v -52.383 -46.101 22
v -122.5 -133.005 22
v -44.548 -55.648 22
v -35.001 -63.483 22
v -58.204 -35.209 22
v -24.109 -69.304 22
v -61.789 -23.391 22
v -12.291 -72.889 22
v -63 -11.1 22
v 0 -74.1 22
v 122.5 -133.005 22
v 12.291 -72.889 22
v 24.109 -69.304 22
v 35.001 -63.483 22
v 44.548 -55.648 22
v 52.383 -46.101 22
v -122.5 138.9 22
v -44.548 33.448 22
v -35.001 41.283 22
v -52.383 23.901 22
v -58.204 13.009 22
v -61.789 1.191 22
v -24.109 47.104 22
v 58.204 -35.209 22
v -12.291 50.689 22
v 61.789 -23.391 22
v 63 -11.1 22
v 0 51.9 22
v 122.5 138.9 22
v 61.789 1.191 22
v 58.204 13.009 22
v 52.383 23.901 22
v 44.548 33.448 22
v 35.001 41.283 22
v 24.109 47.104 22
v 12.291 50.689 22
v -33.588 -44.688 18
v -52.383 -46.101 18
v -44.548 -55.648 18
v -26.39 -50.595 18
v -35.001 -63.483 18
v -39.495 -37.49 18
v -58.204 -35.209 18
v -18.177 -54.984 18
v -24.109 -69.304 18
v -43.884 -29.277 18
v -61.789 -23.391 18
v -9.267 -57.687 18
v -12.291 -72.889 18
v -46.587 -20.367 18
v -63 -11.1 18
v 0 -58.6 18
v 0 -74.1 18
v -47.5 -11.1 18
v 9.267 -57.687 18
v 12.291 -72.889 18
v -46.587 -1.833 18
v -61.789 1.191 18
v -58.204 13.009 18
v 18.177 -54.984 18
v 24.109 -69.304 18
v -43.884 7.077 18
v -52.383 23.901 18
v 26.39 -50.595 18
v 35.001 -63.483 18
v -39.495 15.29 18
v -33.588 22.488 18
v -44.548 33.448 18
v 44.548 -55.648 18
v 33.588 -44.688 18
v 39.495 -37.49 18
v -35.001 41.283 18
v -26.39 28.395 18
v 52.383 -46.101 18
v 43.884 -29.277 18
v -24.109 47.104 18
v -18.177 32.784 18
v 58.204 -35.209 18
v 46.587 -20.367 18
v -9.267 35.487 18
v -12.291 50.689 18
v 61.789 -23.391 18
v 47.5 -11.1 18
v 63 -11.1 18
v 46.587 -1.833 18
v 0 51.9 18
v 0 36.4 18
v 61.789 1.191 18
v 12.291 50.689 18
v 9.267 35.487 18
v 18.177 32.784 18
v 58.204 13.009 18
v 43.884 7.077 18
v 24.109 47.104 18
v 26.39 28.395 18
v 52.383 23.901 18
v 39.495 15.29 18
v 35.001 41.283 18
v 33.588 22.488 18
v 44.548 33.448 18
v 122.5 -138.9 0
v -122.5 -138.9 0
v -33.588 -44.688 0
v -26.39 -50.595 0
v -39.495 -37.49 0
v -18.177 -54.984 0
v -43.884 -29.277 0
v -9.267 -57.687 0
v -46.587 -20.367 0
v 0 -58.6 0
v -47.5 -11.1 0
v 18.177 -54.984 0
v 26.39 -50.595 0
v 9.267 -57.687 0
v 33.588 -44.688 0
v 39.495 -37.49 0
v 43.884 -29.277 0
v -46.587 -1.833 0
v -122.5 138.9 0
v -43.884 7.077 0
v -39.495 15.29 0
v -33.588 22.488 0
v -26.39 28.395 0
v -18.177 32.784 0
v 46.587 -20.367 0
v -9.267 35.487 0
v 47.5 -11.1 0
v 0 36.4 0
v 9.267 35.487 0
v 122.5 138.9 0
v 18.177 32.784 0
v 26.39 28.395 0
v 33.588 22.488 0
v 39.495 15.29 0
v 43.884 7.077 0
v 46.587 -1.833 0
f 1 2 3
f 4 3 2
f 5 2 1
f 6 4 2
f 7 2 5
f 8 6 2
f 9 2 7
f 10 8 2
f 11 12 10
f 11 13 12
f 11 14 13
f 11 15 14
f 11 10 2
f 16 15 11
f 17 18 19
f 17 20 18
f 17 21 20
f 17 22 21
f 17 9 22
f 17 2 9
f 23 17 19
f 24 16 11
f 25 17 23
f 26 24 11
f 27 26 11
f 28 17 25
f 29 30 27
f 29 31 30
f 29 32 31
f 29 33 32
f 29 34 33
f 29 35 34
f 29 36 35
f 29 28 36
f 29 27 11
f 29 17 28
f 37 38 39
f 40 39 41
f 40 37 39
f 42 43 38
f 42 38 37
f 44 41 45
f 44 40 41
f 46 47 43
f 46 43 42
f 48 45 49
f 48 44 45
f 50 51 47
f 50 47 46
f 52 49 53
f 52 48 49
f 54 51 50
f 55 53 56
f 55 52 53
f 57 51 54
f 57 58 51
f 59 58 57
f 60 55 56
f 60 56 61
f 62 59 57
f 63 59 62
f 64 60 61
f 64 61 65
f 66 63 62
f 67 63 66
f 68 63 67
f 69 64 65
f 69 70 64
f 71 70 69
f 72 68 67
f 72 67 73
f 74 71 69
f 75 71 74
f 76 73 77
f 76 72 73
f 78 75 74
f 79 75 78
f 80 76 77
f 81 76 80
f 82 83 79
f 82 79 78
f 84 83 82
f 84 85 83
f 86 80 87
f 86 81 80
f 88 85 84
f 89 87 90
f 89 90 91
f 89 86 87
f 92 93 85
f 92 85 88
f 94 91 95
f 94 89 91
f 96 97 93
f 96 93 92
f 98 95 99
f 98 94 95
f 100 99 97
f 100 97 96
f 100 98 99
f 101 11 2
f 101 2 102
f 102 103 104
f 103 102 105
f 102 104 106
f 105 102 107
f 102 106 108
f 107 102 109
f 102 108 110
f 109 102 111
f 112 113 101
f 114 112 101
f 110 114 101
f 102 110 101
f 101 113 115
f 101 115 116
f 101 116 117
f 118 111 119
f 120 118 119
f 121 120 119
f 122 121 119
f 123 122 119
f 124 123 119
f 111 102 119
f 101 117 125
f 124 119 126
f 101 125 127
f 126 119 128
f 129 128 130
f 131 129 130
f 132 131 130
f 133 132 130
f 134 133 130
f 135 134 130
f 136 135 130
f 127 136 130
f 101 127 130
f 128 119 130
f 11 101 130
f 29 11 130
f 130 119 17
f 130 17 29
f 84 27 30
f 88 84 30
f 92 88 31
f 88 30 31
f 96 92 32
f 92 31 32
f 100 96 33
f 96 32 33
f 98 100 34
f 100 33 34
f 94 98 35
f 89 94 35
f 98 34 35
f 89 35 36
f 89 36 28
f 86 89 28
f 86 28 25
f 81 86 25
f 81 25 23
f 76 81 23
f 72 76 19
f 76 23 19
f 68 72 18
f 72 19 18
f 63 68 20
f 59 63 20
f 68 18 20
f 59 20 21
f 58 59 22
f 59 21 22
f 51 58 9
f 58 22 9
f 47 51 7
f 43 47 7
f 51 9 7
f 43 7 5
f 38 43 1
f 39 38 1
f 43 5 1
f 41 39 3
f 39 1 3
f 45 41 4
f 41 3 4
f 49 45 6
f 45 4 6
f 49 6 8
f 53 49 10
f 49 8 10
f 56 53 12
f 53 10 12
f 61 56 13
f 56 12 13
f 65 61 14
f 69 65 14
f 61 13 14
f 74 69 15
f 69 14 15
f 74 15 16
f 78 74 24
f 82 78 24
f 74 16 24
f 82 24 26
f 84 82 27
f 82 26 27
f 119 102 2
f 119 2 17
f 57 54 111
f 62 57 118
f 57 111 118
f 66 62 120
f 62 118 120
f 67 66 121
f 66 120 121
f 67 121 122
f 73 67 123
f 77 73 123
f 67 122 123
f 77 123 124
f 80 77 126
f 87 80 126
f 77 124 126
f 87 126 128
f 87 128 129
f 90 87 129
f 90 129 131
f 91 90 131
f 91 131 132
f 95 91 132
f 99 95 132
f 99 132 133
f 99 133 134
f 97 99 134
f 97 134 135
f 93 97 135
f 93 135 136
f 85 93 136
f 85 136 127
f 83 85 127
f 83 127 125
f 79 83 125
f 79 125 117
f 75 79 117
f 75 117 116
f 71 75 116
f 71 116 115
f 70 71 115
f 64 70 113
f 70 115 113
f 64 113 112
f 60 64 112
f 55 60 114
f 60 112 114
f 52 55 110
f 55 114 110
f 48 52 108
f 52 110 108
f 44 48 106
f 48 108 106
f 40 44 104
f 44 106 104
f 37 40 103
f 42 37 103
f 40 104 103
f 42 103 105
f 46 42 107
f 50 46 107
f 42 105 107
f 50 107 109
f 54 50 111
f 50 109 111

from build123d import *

# Parameters (mm, degrees)
F0_W     = 245
F0_H     = 277.8
F1_DEPTH = 22
F3_D     = 95
F4_R     = 63
F5_DEPTH = 4
F7_DEPTH = 245.001


with BuildPart() as f1:
    # F0 (on Top) → F1 (new body)
    with BuildSketch(Plane.XY):
        Rectangle(F0_W, F0_H)
    extrude(amount=F1_DEPTH)

    # F3 (through all)
    with Locations(Plane.XY.offset(22)):
        with Locations((0, -11.1)):
            Hole(F3_D / 2)

    # F4 (on face) → F5 (cut)
    with BuildSketch(Plane.XY.offset(22)):
        with Locations((0, -11.1)):
            Circle(F4_R)
    extrude(amount=-F5_DEPTH, mode=Mode.SUBTRACT)

    # F6 (on face) → F7 (cut, through all)
    with BuildSketch(Plane(origin=(-122.5, 0, 0), x_dir=(0, -1, 0), z_dir=(-1, 0, 0))):
        Polygon((133.005118, 22), (138.9, 0), (138.9, 22), align=None)
    extrude(amount=-F7_DEPTH, mode=Mode.SUBTRACT)


solid = f1.part
